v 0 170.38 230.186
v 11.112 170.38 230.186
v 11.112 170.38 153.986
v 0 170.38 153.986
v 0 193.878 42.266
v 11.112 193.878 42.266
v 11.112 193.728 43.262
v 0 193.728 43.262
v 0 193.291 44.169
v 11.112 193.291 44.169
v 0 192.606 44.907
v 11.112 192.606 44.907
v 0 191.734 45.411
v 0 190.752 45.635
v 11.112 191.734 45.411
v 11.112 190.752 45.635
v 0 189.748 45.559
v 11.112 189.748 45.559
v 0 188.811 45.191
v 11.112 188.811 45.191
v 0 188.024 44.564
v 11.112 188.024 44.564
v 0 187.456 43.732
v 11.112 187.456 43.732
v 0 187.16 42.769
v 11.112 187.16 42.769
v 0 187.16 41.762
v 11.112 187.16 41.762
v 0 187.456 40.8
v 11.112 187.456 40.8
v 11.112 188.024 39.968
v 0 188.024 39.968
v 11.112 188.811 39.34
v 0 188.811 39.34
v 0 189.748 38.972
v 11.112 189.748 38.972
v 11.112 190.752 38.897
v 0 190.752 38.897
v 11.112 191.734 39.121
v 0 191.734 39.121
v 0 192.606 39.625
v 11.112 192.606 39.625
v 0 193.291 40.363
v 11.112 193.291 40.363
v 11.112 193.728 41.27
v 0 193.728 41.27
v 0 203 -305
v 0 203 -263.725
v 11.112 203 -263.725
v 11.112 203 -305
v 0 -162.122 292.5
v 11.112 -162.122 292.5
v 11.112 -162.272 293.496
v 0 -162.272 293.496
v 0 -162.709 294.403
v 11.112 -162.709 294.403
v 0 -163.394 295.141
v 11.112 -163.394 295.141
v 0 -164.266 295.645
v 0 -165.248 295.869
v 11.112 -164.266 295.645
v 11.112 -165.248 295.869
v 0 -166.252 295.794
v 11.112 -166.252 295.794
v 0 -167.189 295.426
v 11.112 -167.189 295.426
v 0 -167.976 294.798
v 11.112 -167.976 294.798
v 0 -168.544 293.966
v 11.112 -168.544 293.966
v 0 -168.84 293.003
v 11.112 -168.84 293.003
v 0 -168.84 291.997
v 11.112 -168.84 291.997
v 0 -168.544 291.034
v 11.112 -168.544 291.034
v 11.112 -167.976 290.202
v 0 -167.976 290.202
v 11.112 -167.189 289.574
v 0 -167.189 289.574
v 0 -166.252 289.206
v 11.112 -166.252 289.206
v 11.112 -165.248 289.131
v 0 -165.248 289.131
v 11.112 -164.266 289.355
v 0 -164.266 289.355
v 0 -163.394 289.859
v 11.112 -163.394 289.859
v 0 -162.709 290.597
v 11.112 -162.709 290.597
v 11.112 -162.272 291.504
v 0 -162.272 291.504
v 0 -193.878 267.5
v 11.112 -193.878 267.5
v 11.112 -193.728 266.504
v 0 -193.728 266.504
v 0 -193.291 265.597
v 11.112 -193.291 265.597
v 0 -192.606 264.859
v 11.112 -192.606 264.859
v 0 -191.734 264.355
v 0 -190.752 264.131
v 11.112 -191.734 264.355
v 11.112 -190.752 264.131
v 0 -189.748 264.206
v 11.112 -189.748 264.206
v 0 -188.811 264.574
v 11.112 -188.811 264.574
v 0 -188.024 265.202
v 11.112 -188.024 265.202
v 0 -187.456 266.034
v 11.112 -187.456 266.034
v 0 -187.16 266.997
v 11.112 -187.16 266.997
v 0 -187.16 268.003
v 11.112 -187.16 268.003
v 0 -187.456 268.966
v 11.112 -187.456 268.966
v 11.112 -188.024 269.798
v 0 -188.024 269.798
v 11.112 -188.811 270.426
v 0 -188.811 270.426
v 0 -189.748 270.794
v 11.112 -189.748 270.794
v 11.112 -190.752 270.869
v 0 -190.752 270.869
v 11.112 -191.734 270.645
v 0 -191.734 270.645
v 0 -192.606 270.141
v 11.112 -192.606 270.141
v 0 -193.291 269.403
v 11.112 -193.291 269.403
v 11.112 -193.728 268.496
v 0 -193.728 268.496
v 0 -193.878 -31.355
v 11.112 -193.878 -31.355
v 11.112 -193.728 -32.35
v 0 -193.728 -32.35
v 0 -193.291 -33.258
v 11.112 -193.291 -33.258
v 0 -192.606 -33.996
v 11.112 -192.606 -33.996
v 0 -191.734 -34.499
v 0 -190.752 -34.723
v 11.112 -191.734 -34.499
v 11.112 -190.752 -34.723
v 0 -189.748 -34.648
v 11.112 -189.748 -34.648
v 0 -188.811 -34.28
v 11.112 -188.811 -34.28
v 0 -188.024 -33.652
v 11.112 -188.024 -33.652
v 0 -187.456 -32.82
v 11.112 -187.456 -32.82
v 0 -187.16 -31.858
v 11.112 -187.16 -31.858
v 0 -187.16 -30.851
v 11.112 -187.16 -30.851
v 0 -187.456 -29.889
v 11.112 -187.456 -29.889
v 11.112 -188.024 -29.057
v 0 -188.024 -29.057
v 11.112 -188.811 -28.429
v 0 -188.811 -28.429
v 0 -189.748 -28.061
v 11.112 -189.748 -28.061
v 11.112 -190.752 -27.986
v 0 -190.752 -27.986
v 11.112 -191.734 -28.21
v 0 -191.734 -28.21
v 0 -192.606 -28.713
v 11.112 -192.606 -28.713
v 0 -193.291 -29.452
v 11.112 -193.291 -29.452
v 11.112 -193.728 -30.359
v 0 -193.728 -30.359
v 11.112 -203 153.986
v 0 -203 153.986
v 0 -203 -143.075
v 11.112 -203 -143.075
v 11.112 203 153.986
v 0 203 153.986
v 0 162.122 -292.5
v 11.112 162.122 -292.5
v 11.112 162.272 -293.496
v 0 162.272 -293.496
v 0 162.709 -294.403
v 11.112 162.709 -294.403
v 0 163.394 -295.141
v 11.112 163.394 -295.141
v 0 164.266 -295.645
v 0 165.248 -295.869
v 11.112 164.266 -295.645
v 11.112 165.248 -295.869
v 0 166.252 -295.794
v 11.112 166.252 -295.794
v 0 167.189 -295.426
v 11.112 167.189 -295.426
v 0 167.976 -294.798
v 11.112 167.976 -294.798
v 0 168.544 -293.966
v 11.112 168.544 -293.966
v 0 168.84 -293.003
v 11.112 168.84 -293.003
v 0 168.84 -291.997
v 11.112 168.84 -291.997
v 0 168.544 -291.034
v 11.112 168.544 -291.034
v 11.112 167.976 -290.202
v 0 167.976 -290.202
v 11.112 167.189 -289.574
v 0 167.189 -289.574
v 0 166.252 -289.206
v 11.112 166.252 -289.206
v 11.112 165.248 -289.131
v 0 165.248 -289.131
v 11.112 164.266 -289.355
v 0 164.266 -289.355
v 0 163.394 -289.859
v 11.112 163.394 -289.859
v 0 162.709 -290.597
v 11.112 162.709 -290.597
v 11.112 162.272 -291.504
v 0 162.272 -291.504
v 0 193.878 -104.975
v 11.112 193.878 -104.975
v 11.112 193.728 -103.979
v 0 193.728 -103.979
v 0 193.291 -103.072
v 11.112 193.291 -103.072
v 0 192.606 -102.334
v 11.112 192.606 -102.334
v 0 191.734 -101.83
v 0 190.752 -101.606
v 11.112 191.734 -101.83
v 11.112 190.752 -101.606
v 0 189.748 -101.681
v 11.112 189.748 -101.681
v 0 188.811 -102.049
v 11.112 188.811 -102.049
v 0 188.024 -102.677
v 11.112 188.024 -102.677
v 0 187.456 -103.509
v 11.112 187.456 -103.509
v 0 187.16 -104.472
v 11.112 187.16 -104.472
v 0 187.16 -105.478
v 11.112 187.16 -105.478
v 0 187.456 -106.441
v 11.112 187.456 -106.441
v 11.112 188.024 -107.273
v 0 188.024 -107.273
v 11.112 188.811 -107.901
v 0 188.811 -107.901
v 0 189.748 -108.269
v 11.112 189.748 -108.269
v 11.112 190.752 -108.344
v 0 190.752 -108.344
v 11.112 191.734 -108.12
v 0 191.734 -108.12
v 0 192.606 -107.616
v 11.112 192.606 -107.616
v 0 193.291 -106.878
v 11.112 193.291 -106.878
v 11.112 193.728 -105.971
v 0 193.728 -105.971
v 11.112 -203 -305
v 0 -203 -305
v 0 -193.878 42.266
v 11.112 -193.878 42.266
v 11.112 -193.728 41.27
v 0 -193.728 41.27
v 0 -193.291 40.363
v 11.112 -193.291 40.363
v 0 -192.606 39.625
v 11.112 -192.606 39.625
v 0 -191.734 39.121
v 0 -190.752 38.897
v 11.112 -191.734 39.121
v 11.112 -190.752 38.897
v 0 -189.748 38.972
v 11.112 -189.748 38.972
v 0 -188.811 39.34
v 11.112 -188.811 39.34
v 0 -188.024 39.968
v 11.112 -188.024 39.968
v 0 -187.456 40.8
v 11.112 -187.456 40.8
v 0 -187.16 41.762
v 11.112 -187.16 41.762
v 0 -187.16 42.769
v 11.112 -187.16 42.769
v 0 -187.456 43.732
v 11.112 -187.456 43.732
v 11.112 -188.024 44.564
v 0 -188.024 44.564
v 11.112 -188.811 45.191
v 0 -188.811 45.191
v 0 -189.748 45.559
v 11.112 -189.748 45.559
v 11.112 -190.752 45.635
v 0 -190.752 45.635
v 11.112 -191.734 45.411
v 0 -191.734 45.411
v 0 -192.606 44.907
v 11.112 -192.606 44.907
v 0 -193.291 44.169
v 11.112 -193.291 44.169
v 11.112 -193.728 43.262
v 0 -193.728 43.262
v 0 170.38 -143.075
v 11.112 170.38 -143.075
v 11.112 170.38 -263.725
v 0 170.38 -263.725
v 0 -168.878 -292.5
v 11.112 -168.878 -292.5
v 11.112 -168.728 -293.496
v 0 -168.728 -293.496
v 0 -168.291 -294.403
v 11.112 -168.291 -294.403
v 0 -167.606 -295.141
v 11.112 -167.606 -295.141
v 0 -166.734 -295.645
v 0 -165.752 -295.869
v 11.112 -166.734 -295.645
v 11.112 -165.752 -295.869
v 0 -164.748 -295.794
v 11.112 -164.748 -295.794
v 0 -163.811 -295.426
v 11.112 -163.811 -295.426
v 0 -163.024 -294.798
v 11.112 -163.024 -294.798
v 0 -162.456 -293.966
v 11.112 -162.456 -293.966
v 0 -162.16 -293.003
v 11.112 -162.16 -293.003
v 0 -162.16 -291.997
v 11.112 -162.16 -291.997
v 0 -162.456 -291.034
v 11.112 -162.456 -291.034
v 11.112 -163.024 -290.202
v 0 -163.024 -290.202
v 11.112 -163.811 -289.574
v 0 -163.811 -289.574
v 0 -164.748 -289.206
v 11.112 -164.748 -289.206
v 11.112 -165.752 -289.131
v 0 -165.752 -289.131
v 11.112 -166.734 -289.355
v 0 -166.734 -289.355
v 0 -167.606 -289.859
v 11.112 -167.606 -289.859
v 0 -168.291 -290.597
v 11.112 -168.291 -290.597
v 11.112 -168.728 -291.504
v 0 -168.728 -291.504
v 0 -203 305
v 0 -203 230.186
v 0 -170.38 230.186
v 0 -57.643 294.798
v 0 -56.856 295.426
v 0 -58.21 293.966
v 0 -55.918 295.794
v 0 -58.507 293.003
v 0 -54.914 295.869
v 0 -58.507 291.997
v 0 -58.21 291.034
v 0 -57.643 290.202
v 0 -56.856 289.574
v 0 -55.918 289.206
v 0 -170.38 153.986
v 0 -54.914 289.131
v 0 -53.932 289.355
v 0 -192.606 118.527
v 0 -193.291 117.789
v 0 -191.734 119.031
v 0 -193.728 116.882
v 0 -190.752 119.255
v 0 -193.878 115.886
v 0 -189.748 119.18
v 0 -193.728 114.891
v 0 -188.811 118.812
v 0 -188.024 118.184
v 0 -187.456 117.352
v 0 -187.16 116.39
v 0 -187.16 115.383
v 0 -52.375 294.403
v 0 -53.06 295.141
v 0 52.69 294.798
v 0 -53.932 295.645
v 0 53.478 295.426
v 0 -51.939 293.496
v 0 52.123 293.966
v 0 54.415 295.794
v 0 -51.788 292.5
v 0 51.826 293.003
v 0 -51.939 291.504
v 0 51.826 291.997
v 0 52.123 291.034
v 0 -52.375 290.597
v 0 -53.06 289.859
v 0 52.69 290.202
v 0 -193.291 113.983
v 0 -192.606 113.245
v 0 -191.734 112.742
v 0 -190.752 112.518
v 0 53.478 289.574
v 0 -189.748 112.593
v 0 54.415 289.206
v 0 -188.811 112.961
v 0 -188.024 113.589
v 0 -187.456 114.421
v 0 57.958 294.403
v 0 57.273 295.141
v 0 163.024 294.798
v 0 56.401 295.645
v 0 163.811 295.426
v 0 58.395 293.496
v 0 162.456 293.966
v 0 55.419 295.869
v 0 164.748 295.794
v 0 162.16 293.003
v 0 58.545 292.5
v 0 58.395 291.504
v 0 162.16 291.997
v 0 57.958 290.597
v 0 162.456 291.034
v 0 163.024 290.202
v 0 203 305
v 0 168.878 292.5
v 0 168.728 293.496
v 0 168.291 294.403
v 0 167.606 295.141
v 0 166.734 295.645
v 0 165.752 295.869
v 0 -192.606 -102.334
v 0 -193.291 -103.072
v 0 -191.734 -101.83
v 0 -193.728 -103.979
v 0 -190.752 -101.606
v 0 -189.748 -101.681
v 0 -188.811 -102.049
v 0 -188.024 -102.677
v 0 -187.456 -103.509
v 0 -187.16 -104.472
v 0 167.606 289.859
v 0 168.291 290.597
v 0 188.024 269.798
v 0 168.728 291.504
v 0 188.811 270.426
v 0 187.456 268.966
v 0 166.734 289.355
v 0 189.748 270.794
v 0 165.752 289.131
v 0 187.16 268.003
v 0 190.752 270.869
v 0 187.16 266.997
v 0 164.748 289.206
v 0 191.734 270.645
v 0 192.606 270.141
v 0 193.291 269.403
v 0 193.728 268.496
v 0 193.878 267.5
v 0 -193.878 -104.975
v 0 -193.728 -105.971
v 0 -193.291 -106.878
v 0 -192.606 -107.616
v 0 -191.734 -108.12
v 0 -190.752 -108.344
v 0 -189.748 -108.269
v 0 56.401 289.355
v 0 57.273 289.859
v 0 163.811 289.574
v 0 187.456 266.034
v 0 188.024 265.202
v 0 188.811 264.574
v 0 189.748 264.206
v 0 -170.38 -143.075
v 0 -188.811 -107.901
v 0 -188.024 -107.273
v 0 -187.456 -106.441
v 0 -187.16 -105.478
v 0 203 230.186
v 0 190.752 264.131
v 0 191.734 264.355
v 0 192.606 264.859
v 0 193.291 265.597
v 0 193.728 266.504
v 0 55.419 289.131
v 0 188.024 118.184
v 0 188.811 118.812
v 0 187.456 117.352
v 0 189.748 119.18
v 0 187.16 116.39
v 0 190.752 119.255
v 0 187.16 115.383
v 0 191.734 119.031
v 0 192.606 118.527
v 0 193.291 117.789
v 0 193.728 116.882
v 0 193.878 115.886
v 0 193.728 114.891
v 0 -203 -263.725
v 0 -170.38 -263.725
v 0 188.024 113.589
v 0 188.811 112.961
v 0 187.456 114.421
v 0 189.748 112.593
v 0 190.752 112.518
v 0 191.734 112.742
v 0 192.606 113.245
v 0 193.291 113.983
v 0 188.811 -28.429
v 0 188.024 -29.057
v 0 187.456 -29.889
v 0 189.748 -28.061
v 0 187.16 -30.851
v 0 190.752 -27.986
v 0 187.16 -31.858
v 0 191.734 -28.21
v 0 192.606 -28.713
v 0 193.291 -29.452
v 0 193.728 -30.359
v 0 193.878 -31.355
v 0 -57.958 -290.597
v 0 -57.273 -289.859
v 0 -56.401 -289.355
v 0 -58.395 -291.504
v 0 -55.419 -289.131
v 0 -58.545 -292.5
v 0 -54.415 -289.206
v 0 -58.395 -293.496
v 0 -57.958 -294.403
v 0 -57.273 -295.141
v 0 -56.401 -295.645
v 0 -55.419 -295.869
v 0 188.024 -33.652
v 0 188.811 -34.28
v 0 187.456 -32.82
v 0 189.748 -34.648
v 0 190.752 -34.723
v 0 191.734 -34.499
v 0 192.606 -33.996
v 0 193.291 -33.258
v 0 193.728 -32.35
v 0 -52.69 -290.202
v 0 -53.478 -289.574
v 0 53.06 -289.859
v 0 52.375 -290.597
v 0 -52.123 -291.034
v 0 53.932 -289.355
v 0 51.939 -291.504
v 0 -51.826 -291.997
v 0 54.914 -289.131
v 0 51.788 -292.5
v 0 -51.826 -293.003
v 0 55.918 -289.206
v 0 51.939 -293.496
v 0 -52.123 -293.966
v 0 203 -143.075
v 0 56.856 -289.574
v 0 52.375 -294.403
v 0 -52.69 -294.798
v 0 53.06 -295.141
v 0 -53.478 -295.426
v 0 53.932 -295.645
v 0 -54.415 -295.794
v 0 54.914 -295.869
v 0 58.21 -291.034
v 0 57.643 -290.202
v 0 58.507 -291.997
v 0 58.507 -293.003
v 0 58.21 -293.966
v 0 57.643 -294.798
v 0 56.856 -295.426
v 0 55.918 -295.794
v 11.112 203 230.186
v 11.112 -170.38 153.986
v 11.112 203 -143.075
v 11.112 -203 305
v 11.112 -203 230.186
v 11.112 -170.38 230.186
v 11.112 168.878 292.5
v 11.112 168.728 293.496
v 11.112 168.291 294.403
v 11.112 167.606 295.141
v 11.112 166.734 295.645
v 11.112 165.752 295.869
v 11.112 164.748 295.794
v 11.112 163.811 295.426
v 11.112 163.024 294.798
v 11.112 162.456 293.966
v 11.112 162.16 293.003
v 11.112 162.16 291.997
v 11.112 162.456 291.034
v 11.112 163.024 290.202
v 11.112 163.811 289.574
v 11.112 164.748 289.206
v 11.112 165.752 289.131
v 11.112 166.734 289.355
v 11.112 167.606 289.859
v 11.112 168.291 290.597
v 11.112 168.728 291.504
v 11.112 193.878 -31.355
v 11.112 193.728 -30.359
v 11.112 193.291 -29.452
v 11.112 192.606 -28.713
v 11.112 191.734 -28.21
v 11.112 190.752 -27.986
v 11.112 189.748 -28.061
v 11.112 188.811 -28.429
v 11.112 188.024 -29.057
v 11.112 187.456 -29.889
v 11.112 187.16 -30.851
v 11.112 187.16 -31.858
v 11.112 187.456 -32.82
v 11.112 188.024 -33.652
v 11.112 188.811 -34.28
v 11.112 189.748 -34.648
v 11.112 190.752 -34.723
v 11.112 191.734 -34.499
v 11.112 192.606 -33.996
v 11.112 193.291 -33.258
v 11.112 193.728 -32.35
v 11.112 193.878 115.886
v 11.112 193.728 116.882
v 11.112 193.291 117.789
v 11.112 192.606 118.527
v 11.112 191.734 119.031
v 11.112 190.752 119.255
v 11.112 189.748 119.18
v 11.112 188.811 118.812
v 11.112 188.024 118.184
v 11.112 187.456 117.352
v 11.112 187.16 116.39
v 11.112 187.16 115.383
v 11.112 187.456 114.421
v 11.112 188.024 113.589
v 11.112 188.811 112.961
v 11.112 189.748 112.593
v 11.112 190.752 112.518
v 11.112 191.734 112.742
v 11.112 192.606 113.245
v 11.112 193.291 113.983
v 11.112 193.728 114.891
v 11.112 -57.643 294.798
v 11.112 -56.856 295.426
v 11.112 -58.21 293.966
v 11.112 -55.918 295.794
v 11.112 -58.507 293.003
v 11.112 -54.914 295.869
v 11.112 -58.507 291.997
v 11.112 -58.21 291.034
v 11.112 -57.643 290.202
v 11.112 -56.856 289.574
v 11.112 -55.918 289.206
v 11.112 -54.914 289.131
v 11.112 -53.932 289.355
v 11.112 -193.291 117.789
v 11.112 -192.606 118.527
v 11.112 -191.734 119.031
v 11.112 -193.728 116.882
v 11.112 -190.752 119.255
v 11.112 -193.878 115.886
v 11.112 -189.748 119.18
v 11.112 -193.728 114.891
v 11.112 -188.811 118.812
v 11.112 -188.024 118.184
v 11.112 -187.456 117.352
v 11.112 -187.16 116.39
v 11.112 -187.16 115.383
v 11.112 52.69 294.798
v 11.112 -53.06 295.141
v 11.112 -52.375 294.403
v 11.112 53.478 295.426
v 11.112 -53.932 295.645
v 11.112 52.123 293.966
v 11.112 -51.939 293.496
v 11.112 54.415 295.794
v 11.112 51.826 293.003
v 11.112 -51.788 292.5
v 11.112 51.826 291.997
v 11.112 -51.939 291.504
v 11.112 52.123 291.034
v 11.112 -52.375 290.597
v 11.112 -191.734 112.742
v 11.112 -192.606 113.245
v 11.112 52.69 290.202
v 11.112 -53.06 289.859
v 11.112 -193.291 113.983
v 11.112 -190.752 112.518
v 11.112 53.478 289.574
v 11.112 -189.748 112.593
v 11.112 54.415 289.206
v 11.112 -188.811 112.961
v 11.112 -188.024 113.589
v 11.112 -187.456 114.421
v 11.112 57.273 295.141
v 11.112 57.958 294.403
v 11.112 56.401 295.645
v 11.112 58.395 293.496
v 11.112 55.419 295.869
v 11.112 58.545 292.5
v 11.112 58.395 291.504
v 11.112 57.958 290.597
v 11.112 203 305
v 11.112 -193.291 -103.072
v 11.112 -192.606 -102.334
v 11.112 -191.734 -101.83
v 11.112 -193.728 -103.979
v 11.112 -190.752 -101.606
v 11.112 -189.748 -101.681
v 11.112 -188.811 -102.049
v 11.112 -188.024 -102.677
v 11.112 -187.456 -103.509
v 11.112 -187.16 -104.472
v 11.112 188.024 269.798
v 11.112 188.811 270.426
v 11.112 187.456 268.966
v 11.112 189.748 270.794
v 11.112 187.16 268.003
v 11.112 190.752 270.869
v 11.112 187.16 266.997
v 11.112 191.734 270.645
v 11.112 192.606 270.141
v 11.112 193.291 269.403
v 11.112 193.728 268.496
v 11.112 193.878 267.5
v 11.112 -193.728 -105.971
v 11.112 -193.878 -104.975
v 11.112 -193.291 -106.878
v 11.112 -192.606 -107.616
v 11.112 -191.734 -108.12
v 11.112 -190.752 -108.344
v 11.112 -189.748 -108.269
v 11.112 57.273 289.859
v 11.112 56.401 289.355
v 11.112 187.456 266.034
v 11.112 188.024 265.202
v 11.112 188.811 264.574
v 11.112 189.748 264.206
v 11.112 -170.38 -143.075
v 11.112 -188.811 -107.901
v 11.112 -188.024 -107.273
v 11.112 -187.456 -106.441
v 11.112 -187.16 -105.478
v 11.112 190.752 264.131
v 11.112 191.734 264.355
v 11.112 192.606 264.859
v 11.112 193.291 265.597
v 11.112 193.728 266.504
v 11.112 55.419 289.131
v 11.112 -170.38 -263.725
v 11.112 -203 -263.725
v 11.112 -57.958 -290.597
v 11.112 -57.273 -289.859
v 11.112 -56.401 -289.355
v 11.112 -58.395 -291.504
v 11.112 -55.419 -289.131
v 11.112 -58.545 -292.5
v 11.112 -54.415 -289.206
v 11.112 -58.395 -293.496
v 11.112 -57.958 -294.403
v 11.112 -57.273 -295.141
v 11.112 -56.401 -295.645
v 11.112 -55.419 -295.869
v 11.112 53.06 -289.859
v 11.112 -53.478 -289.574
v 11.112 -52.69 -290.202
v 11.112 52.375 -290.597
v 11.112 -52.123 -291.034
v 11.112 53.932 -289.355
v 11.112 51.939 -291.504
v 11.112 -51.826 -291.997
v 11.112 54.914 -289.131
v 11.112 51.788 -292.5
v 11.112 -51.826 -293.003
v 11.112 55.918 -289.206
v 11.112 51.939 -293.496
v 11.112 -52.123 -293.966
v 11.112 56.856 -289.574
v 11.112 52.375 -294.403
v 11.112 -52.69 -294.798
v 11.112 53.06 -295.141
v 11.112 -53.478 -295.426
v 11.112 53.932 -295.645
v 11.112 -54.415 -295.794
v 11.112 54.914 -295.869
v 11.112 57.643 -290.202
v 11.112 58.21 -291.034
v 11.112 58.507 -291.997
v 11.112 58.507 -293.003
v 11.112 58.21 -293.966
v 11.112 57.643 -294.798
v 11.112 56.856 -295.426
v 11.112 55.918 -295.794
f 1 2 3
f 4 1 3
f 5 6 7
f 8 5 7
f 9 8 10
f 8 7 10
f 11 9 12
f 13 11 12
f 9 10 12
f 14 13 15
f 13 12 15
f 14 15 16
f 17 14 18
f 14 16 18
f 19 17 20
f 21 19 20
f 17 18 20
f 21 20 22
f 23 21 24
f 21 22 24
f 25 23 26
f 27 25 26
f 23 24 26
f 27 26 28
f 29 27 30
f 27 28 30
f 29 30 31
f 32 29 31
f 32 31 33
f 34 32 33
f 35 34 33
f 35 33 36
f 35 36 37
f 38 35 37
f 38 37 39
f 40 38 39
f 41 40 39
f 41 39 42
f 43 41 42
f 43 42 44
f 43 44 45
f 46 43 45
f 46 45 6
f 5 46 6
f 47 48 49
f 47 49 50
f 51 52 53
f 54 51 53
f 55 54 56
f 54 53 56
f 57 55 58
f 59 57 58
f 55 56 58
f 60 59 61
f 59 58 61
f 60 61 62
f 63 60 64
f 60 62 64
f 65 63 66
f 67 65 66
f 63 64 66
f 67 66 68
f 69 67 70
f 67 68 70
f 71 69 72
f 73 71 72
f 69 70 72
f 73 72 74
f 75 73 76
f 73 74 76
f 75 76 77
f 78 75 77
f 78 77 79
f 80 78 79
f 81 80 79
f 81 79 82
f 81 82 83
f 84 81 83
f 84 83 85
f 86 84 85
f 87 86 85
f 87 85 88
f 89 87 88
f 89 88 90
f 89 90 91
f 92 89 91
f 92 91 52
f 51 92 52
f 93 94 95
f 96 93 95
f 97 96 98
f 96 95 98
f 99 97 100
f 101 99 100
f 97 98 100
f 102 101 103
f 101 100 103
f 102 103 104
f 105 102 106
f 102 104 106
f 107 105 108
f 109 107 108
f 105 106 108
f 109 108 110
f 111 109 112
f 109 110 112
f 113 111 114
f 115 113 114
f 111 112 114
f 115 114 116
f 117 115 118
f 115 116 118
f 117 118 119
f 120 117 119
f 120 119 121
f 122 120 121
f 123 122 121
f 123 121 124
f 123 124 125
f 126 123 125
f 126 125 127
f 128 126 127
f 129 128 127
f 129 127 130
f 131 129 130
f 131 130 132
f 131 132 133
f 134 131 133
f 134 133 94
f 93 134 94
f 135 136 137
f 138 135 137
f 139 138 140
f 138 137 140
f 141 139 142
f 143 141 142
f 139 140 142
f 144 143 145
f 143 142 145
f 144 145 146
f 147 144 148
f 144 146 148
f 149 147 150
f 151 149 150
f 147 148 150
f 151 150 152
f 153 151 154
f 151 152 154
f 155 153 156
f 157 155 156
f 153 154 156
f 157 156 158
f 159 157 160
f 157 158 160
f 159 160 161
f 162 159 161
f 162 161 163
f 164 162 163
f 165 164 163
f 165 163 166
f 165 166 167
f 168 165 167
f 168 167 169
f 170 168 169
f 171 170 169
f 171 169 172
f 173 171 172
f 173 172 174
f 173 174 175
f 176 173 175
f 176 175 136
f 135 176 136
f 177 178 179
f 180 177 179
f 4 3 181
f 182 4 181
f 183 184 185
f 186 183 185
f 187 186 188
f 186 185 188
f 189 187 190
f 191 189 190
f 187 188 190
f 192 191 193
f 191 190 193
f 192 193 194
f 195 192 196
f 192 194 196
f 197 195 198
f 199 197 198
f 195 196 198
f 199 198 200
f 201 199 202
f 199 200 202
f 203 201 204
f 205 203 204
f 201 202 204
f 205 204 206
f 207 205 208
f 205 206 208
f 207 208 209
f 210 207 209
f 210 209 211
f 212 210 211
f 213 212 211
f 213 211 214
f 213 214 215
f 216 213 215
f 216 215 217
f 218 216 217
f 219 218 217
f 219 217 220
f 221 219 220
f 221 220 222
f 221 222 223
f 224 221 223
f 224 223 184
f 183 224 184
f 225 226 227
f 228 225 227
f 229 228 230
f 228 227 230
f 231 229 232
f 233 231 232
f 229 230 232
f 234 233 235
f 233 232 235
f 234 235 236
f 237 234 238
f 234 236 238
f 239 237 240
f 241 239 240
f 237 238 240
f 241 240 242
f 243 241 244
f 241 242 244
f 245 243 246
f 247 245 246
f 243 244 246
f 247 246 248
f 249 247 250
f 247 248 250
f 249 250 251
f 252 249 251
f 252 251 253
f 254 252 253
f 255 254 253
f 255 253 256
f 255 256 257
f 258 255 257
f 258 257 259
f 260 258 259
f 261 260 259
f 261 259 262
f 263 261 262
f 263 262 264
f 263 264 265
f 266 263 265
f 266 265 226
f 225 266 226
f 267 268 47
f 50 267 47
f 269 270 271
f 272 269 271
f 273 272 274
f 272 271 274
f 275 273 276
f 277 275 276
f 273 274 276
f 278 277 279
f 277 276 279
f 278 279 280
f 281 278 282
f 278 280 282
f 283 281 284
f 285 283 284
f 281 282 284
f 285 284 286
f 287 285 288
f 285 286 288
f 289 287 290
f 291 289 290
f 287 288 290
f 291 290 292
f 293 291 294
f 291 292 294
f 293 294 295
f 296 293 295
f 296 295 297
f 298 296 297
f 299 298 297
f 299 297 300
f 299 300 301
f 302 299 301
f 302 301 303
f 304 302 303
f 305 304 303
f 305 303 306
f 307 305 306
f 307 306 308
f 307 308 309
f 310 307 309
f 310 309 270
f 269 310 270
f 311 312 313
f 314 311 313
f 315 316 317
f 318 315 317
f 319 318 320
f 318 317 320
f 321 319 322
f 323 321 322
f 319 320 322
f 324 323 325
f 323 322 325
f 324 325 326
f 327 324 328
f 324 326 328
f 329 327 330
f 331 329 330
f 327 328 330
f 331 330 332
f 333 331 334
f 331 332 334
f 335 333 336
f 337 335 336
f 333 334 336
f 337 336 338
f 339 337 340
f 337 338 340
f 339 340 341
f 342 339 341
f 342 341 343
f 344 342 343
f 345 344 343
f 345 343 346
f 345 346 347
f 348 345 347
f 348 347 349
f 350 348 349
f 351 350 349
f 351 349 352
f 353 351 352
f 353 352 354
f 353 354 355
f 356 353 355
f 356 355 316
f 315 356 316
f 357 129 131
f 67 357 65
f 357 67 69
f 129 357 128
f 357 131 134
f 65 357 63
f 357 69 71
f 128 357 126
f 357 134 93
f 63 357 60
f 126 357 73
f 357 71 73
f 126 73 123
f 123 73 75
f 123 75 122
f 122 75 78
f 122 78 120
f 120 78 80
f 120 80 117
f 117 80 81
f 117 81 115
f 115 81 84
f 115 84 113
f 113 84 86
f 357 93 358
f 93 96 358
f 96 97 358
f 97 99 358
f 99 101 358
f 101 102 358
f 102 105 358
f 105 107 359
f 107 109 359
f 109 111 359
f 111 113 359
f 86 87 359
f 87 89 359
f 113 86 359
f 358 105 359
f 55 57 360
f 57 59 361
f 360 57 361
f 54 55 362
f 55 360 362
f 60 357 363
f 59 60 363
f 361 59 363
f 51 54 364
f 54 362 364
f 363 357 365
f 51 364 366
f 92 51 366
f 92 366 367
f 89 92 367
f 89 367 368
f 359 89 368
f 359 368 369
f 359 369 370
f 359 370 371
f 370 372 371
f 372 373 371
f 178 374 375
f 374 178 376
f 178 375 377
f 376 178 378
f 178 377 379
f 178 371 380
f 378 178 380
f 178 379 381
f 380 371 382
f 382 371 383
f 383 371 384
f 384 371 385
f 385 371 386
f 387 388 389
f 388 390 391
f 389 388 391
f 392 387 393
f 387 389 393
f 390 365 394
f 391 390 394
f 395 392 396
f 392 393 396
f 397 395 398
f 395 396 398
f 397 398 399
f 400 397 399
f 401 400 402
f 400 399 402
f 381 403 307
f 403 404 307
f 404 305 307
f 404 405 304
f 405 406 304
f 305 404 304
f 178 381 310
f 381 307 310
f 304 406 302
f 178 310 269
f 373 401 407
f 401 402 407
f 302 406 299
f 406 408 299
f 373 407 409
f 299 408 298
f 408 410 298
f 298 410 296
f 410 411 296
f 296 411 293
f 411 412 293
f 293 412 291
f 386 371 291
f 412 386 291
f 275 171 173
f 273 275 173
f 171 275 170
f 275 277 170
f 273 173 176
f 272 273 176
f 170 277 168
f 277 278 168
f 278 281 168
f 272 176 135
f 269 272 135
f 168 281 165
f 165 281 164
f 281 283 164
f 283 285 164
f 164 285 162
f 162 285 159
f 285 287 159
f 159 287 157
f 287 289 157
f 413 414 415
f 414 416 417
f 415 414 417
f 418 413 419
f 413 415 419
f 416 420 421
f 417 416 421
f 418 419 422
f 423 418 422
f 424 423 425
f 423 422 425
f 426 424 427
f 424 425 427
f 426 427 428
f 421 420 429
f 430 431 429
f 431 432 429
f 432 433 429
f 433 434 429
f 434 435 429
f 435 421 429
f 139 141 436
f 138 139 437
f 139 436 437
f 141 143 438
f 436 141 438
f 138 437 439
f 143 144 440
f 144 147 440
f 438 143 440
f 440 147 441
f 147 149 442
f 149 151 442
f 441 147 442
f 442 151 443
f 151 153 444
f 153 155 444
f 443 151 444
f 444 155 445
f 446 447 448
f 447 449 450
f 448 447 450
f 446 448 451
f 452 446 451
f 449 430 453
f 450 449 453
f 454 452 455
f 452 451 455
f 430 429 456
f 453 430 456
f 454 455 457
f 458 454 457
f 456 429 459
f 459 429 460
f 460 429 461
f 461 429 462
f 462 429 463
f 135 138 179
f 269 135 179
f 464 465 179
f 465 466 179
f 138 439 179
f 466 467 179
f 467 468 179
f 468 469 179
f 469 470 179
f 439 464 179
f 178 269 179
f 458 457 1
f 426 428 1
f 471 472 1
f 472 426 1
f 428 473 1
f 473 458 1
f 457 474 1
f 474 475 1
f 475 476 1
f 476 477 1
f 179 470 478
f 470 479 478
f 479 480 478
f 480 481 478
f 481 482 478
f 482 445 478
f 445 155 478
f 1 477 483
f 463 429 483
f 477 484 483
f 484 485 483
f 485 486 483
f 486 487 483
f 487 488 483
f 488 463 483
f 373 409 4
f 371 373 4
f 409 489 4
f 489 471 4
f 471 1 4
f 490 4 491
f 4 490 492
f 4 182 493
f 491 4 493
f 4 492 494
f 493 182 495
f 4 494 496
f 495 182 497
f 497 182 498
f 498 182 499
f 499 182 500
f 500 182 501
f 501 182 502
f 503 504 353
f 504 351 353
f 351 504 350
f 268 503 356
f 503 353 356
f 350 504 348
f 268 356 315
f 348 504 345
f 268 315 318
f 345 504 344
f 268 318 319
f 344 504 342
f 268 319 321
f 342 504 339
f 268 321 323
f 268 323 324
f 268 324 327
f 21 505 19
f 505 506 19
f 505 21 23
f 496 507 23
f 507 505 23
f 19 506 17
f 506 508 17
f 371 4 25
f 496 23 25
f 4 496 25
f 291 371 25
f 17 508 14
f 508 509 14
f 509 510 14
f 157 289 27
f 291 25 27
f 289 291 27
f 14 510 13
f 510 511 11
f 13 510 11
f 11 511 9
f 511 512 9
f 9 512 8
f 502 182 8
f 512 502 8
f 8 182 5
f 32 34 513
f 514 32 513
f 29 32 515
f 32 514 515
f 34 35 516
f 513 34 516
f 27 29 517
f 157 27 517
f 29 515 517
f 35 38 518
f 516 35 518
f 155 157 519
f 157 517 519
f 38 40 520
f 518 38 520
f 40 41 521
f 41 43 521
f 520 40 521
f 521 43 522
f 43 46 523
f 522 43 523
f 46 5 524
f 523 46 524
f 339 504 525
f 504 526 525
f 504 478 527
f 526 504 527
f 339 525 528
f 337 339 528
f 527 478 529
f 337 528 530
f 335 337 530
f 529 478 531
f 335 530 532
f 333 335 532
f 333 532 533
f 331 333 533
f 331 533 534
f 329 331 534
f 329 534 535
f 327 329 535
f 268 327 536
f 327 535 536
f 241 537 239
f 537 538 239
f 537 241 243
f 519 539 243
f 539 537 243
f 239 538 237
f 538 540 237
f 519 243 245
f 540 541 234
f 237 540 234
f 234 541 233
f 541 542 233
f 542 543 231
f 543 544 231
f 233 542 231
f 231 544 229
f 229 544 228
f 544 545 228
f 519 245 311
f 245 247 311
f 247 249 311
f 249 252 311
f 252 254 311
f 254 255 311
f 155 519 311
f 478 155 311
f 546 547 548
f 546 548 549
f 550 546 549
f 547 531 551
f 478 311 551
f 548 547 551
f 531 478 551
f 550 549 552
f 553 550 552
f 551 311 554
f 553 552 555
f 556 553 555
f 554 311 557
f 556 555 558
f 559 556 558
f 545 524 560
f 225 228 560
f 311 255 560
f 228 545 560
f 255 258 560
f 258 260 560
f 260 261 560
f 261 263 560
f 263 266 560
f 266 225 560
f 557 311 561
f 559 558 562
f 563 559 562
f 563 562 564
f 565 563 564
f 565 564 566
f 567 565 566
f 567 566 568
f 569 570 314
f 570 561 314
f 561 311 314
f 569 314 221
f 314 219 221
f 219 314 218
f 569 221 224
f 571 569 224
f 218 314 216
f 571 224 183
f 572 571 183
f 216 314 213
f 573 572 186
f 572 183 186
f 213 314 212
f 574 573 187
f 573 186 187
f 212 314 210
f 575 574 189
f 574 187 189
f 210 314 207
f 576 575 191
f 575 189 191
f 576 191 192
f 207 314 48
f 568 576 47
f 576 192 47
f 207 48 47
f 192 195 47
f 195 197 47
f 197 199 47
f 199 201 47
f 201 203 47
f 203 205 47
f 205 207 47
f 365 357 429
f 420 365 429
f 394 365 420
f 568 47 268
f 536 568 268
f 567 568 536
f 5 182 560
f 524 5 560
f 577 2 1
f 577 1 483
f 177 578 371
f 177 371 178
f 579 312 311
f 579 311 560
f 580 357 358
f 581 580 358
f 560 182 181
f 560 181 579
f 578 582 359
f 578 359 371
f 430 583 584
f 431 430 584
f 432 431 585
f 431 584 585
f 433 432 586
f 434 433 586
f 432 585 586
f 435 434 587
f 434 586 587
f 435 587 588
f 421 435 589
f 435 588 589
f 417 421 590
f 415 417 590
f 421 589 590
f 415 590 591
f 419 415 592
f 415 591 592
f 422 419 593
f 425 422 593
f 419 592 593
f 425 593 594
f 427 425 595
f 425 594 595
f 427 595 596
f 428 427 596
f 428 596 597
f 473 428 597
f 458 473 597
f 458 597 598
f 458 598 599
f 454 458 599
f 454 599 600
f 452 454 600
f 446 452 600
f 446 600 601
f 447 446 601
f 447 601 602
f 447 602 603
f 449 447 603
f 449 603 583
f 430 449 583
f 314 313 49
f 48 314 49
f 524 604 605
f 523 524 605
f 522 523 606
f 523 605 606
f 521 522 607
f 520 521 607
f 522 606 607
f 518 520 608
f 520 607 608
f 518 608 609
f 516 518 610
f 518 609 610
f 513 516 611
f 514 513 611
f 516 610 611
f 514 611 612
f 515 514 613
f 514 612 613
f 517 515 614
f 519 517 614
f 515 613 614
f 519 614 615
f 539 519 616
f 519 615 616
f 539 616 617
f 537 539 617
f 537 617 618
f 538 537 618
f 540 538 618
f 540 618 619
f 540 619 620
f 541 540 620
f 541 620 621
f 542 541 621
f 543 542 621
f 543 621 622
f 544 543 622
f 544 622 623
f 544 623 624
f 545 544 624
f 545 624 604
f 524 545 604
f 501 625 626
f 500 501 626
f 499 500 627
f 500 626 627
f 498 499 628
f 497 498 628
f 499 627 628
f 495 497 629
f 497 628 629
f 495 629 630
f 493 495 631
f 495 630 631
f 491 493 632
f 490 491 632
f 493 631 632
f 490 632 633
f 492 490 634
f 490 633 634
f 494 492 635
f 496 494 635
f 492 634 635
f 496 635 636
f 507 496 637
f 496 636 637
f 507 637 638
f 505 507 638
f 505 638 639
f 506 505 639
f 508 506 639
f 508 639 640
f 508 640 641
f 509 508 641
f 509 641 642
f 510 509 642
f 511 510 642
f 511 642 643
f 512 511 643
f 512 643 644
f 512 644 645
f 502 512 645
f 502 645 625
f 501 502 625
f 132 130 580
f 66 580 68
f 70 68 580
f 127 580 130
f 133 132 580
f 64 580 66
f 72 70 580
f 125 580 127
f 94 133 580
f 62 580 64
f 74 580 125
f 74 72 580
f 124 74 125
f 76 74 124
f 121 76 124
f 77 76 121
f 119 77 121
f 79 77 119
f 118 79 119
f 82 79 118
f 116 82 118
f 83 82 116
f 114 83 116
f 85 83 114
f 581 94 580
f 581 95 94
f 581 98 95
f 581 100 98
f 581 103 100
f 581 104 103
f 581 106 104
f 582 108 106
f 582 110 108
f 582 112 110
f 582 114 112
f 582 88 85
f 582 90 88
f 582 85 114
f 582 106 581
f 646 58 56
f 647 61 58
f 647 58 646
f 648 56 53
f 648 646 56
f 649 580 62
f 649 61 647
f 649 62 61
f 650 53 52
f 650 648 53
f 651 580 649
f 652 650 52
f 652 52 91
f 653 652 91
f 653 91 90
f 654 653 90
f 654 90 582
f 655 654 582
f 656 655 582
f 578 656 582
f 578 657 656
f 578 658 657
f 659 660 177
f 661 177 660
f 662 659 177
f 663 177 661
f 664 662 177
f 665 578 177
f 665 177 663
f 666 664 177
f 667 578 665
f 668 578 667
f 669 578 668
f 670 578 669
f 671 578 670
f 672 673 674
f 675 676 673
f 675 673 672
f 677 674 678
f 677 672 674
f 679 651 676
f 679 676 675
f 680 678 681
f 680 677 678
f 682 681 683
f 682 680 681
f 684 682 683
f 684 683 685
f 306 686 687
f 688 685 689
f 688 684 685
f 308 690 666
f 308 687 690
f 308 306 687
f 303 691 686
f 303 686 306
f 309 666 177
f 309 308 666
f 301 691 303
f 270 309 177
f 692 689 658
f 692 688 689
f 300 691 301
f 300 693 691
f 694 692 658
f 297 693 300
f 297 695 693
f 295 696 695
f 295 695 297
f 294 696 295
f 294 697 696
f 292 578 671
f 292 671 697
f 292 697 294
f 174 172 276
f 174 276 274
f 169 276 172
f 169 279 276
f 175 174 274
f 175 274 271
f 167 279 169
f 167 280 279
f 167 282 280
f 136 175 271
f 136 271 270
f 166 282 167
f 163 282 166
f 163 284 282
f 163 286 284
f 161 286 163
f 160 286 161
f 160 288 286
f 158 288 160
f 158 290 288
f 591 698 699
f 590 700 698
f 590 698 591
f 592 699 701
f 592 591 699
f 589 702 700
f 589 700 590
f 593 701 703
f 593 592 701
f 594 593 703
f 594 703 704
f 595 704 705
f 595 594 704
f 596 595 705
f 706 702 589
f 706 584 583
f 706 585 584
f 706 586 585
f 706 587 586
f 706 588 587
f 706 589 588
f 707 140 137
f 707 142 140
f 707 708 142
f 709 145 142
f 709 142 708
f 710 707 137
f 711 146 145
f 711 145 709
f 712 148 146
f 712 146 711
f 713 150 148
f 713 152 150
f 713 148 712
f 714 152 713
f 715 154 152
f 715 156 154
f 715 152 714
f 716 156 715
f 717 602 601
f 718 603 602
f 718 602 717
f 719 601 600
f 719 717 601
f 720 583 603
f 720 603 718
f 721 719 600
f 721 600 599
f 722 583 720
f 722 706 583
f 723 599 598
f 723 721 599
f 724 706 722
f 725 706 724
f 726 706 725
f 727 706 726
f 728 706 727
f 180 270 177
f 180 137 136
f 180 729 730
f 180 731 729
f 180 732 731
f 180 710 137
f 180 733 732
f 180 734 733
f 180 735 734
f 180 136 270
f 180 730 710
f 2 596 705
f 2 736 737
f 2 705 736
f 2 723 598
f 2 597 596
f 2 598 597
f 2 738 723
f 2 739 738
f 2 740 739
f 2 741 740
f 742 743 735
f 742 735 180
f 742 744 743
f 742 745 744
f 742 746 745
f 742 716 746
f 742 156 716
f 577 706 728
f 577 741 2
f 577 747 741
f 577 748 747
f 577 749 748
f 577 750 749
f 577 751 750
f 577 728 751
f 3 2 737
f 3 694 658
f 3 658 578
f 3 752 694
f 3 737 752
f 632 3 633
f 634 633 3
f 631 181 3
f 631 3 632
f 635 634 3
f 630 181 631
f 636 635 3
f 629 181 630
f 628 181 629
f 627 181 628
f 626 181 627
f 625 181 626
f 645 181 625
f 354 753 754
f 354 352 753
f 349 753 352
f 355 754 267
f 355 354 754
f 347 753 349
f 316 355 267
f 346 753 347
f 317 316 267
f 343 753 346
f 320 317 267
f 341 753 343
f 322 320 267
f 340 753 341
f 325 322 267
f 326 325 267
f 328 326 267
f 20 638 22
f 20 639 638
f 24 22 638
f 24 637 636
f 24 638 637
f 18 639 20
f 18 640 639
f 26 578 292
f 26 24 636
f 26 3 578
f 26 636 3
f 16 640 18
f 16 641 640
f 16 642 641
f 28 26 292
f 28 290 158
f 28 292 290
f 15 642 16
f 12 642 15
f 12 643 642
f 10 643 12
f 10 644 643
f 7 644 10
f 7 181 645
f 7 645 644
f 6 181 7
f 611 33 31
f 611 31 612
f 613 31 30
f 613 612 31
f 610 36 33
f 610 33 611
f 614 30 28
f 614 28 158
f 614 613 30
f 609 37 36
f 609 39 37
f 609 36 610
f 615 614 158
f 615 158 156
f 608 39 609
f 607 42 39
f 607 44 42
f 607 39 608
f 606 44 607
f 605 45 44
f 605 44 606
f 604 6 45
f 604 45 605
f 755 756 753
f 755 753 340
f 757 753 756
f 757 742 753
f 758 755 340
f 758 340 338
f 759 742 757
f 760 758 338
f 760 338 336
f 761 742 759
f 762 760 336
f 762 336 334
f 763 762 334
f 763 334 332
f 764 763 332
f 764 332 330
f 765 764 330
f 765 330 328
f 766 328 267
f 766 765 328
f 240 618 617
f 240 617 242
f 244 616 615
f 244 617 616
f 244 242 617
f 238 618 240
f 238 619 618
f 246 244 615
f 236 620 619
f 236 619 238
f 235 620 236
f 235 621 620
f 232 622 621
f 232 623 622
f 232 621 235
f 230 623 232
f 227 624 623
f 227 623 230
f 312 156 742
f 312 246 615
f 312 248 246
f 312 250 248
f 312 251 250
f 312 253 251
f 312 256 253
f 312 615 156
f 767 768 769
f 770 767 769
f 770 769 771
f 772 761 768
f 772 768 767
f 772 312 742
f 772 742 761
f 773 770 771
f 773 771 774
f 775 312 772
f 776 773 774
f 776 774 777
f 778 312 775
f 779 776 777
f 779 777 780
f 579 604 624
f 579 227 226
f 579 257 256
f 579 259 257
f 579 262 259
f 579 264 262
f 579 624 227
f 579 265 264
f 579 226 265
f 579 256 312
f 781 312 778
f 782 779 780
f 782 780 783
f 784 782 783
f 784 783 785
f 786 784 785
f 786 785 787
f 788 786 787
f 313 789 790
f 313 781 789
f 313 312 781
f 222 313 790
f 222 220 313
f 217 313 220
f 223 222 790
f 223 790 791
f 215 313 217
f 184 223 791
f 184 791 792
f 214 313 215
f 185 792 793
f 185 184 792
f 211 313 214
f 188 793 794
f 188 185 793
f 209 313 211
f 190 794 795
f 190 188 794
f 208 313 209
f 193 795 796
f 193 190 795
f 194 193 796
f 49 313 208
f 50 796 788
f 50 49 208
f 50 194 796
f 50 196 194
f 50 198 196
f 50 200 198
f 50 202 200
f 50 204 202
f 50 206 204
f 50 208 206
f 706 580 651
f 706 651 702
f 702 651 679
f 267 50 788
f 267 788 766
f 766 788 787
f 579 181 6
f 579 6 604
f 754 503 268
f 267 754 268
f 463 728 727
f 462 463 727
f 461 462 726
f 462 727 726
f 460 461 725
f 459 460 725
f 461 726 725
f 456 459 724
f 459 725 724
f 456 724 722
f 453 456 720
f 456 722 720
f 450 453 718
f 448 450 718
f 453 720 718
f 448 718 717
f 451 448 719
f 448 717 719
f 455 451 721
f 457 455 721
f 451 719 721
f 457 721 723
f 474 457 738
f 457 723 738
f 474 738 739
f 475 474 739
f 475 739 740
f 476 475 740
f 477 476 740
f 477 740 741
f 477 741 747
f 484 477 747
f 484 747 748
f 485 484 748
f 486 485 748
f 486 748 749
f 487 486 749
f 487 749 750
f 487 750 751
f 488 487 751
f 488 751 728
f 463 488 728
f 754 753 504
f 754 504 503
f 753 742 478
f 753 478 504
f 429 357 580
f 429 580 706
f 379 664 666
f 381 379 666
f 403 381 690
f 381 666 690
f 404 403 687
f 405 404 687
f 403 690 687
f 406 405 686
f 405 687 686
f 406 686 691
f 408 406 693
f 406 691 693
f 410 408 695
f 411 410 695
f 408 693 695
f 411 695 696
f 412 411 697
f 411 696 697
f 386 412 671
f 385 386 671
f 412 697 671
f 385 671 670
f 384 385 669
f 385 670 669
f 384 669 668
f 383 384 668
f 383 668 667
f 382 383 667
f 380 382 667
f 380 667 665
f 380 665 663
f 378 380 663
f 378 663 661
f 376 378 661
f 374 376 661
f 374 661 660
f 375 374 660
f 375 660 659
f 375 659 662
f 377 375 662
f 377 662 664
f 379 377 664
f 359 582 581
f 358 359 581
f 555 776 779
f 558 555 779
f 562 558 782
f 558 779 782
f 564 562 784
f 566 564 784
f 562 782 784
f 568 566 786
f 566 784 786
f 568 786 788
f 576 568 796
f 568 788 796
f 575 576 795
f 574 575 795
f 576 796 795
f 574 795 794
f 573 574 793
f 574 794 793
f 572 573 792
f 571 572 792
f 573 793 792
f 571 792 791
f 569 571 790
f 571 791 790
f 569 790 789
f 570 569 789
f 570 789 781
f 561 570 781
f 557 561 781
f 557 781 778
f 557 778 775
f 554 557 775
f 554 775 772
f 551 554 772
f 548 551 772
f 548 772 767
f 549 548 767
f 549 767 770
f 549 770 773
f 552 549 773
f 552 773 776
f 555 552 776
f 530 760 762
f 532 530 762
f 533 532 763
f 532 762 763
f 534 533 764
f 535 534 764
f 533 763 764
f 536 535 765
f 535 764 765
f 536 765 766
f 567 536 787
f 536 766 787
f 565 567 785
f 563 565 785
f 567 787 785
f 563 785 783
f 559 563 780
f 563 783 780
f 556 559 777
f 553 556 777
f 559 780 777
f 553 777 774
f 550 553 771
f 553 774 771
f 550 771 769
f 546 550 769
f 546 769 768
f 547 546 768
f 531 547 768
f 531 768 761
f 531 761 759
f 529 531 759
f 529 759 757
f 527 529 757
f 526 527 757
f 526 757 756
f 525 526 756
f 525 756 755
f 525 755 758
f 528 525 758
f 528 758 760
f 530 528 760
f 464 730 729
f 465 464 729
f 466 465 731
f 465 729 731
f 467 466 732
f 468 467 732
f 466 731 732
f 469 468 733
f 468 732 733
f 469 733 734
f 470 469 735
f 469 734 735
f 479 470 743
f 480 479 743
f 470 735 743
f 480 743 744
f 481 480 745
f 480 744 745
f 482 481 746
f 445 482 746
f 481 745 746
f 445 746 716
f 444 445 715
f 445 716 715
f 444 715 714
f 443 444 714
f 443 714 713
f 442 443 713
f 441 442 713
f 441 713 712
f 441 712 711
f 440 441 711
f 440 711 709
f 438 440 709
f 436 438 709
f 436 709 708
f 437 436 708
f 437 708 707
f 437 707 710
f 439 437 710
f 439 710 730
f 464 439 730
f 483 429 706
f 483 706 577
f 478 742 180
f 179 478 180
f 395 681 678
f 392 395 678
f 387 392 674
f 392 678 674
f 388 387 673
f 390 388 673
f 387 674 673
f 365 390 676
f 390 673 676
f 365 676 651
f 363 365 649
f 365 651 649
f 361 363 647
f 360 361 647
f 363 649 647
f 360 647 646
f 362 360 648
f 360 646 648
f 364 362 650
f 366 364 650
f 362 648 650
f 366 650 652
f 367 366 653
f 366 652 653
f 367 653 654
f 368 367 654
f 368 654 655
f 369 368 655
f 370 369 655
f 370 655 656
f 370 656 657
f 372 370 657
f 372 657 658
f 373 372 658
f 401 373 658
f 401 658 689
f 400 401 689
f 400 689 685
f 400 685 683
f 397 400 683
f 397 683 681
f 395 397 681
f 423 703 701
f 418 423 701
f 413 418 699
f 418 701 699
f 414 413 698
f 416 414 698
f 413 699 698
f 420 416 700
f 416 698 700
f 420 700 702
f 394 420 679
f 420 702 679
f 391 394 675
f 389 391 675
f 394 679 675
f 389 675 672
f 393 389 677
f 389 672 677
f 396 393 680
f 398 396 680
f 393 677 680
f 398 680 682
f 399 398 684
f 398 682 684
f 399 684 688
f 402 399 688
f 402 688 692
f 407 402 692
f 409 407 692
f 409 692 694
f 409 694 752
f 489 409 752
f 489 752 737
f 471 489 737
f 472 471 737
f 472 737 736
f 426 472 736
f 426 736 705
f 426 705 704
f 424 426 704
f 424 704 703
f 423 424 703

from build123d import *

# Parameters (mm, degrees)
SKETCH1_W           = 610
SKETCH1_H           = 406
BOSS_EXTRUDE1_DEPTH = 11.1125
SKETCH3_W           = 120.65
SKETCH3_H           = 32.62
CUT_EXTRUDE2_DEPTH  = 367.548070048
SKETCH8_W           = 76.2
SKETCH8_H           = 32.62
CUT_EXTRUDE3_DEPTH  = 367.548070048
SKETCH4_R           = 3.3782
CUT_EXTRUDE4_DEPTH  = 367.548070048


with BuildPart() as part:
    # Sketch1 → Boss-Extrude1 (new body)
    with BuildSketch(Plane(origin=(0, 0, 0), x_dir=(0, 0, -1), z_dir=(1, 0, 0))):
        Rectangle(SKETCH1_W, SKETCH1_H)
    extrude(amount=BOSS_EXTRUDE1_DEPTH)

    # Sketch3 → Cut-Extrude2 (cut, through all)
    with BuildSketch(Plane(origin=(11.1125, 0, 0), x_dir=(0, 0, -1), z_dir=(1, 0, 0))):
        with Locations((203.4, 186.69)):
            Rectangle(SKETCH3_W, SKETCH3_H)
    cut_extrude2 = extrude(amount=-CUT_EXTRUDE2_DEPTH, mode=Mode.SUBTRACT)

    # Sketch8 → Cut-Extrude3 (cut, through all)
    with BuildSketch(Plane(origin=(11.1125, 0, 0), x_dir=(0, 0, -1), z_dir=(1, 0, 0))):
        with Locations((-192.086299996, 186.69)):
            Rectangle(SKETCH8_W, SKETCH8_H)
    cut_extrude3 = extrude(amount=-CUT_EXTRUDE3_DEPTH, mode=Mode.SUBTRACT)

    # Mirror3: Cut-Extrude2, Cut-Extrude3 across plane
    add(cut_extrude2.mirror(Plane.ZX), mode=Mode.SUBTRACT)
    add(cut_extrude3.mirror(Plane.ZX), mode=Mode.SUBTRACT)

    # Sketch4 → Cut-Extrude4 (cut, through all)
    with BuildSketch(Plane(origin=(11.1125, 0, 0), x_dir=(0, 0, -1), z_dir=(1, 0, 0))):
        with Locations(Location((-292.5, 165.50000007, 0), (0, 0, 90))):
            Circle(SKETCH4_R)
        with Locations(Location((-292.5, 55.16666669, 0), (0, 0, 90))):
            Circle(SKETCH4_R)
        with Locations(Location((-292.5, -55.16666669, 0), (0, 0, 90))):
            Circle(SKETCH4_R)
        with Locations(Location((-292.5, -165.50000007, 0), (0, 0, 90))):
            Circle(SKETCH4_R)
        with Locations(Location((292.5, -165.50000007, 0), (0, 0, 270))):
            Circle(SKETCH4_R)
        with Locations(Location((292.5, -55.16666669, 0), (0, 0, 270))):
            Circle(SKETCH4_R)
        with Locations(Location((292.5, 165.50000007, 0), (0, 0, 270))):
            Circle(SKETCH4_R)
        with Locations(Location((292.5, 55.16666669, 0), (0, 0, 270))):
            Circle(SKETCH4_R)
        with Locations(Location((-267.50000007, 190.5, 0), (0, 0, 90))):
            Circle(SKETCH4_R)
        with Locations(Location((-115.886299996, 190.5, 0), (0, 0, 90))):
            Circle(SKETCH4_R)
        with Locations(Location((-42.265866664, 190.5, 0), (0, 0, 90))):
            Circle(SKETCH4_R)
        with Locations(Location((31.354566668, 190.5, 0), (0, 0, 90))):
            Circle(SKETCH4_R)
        with Locations(Location((104.975, 190.5, 0), (0, 0, 90))):
            Circle(SKETCH4_R)
        with Locations(Location((104.975, -190.5, 0), (0, 0, 270))):
            Circle(SKETCH4_R)
        with Locations(Location((31.354566668, -190.5, 0), (0, 0, 270))):
            Circle(SKETCH4_R)
        with Locations(Location((-42.265866664, -190.5, 0), (0, 0, 270))):
            Circle(SKETCH4_R)
        with Locations(Location((-115.886299996, -190.5, 0), (0, 0, 270))):
            Circle(SKETCH4_R)
        with Locations(Location((-267.50000007, -190.5, 0), (0, 0, 270))):
            Circle(SKETCH4_R)
    extrude(amount=-CUT_EXTRUDE4_DEPTH, mode=Mode.SUBTRACT)


solid = part.part
